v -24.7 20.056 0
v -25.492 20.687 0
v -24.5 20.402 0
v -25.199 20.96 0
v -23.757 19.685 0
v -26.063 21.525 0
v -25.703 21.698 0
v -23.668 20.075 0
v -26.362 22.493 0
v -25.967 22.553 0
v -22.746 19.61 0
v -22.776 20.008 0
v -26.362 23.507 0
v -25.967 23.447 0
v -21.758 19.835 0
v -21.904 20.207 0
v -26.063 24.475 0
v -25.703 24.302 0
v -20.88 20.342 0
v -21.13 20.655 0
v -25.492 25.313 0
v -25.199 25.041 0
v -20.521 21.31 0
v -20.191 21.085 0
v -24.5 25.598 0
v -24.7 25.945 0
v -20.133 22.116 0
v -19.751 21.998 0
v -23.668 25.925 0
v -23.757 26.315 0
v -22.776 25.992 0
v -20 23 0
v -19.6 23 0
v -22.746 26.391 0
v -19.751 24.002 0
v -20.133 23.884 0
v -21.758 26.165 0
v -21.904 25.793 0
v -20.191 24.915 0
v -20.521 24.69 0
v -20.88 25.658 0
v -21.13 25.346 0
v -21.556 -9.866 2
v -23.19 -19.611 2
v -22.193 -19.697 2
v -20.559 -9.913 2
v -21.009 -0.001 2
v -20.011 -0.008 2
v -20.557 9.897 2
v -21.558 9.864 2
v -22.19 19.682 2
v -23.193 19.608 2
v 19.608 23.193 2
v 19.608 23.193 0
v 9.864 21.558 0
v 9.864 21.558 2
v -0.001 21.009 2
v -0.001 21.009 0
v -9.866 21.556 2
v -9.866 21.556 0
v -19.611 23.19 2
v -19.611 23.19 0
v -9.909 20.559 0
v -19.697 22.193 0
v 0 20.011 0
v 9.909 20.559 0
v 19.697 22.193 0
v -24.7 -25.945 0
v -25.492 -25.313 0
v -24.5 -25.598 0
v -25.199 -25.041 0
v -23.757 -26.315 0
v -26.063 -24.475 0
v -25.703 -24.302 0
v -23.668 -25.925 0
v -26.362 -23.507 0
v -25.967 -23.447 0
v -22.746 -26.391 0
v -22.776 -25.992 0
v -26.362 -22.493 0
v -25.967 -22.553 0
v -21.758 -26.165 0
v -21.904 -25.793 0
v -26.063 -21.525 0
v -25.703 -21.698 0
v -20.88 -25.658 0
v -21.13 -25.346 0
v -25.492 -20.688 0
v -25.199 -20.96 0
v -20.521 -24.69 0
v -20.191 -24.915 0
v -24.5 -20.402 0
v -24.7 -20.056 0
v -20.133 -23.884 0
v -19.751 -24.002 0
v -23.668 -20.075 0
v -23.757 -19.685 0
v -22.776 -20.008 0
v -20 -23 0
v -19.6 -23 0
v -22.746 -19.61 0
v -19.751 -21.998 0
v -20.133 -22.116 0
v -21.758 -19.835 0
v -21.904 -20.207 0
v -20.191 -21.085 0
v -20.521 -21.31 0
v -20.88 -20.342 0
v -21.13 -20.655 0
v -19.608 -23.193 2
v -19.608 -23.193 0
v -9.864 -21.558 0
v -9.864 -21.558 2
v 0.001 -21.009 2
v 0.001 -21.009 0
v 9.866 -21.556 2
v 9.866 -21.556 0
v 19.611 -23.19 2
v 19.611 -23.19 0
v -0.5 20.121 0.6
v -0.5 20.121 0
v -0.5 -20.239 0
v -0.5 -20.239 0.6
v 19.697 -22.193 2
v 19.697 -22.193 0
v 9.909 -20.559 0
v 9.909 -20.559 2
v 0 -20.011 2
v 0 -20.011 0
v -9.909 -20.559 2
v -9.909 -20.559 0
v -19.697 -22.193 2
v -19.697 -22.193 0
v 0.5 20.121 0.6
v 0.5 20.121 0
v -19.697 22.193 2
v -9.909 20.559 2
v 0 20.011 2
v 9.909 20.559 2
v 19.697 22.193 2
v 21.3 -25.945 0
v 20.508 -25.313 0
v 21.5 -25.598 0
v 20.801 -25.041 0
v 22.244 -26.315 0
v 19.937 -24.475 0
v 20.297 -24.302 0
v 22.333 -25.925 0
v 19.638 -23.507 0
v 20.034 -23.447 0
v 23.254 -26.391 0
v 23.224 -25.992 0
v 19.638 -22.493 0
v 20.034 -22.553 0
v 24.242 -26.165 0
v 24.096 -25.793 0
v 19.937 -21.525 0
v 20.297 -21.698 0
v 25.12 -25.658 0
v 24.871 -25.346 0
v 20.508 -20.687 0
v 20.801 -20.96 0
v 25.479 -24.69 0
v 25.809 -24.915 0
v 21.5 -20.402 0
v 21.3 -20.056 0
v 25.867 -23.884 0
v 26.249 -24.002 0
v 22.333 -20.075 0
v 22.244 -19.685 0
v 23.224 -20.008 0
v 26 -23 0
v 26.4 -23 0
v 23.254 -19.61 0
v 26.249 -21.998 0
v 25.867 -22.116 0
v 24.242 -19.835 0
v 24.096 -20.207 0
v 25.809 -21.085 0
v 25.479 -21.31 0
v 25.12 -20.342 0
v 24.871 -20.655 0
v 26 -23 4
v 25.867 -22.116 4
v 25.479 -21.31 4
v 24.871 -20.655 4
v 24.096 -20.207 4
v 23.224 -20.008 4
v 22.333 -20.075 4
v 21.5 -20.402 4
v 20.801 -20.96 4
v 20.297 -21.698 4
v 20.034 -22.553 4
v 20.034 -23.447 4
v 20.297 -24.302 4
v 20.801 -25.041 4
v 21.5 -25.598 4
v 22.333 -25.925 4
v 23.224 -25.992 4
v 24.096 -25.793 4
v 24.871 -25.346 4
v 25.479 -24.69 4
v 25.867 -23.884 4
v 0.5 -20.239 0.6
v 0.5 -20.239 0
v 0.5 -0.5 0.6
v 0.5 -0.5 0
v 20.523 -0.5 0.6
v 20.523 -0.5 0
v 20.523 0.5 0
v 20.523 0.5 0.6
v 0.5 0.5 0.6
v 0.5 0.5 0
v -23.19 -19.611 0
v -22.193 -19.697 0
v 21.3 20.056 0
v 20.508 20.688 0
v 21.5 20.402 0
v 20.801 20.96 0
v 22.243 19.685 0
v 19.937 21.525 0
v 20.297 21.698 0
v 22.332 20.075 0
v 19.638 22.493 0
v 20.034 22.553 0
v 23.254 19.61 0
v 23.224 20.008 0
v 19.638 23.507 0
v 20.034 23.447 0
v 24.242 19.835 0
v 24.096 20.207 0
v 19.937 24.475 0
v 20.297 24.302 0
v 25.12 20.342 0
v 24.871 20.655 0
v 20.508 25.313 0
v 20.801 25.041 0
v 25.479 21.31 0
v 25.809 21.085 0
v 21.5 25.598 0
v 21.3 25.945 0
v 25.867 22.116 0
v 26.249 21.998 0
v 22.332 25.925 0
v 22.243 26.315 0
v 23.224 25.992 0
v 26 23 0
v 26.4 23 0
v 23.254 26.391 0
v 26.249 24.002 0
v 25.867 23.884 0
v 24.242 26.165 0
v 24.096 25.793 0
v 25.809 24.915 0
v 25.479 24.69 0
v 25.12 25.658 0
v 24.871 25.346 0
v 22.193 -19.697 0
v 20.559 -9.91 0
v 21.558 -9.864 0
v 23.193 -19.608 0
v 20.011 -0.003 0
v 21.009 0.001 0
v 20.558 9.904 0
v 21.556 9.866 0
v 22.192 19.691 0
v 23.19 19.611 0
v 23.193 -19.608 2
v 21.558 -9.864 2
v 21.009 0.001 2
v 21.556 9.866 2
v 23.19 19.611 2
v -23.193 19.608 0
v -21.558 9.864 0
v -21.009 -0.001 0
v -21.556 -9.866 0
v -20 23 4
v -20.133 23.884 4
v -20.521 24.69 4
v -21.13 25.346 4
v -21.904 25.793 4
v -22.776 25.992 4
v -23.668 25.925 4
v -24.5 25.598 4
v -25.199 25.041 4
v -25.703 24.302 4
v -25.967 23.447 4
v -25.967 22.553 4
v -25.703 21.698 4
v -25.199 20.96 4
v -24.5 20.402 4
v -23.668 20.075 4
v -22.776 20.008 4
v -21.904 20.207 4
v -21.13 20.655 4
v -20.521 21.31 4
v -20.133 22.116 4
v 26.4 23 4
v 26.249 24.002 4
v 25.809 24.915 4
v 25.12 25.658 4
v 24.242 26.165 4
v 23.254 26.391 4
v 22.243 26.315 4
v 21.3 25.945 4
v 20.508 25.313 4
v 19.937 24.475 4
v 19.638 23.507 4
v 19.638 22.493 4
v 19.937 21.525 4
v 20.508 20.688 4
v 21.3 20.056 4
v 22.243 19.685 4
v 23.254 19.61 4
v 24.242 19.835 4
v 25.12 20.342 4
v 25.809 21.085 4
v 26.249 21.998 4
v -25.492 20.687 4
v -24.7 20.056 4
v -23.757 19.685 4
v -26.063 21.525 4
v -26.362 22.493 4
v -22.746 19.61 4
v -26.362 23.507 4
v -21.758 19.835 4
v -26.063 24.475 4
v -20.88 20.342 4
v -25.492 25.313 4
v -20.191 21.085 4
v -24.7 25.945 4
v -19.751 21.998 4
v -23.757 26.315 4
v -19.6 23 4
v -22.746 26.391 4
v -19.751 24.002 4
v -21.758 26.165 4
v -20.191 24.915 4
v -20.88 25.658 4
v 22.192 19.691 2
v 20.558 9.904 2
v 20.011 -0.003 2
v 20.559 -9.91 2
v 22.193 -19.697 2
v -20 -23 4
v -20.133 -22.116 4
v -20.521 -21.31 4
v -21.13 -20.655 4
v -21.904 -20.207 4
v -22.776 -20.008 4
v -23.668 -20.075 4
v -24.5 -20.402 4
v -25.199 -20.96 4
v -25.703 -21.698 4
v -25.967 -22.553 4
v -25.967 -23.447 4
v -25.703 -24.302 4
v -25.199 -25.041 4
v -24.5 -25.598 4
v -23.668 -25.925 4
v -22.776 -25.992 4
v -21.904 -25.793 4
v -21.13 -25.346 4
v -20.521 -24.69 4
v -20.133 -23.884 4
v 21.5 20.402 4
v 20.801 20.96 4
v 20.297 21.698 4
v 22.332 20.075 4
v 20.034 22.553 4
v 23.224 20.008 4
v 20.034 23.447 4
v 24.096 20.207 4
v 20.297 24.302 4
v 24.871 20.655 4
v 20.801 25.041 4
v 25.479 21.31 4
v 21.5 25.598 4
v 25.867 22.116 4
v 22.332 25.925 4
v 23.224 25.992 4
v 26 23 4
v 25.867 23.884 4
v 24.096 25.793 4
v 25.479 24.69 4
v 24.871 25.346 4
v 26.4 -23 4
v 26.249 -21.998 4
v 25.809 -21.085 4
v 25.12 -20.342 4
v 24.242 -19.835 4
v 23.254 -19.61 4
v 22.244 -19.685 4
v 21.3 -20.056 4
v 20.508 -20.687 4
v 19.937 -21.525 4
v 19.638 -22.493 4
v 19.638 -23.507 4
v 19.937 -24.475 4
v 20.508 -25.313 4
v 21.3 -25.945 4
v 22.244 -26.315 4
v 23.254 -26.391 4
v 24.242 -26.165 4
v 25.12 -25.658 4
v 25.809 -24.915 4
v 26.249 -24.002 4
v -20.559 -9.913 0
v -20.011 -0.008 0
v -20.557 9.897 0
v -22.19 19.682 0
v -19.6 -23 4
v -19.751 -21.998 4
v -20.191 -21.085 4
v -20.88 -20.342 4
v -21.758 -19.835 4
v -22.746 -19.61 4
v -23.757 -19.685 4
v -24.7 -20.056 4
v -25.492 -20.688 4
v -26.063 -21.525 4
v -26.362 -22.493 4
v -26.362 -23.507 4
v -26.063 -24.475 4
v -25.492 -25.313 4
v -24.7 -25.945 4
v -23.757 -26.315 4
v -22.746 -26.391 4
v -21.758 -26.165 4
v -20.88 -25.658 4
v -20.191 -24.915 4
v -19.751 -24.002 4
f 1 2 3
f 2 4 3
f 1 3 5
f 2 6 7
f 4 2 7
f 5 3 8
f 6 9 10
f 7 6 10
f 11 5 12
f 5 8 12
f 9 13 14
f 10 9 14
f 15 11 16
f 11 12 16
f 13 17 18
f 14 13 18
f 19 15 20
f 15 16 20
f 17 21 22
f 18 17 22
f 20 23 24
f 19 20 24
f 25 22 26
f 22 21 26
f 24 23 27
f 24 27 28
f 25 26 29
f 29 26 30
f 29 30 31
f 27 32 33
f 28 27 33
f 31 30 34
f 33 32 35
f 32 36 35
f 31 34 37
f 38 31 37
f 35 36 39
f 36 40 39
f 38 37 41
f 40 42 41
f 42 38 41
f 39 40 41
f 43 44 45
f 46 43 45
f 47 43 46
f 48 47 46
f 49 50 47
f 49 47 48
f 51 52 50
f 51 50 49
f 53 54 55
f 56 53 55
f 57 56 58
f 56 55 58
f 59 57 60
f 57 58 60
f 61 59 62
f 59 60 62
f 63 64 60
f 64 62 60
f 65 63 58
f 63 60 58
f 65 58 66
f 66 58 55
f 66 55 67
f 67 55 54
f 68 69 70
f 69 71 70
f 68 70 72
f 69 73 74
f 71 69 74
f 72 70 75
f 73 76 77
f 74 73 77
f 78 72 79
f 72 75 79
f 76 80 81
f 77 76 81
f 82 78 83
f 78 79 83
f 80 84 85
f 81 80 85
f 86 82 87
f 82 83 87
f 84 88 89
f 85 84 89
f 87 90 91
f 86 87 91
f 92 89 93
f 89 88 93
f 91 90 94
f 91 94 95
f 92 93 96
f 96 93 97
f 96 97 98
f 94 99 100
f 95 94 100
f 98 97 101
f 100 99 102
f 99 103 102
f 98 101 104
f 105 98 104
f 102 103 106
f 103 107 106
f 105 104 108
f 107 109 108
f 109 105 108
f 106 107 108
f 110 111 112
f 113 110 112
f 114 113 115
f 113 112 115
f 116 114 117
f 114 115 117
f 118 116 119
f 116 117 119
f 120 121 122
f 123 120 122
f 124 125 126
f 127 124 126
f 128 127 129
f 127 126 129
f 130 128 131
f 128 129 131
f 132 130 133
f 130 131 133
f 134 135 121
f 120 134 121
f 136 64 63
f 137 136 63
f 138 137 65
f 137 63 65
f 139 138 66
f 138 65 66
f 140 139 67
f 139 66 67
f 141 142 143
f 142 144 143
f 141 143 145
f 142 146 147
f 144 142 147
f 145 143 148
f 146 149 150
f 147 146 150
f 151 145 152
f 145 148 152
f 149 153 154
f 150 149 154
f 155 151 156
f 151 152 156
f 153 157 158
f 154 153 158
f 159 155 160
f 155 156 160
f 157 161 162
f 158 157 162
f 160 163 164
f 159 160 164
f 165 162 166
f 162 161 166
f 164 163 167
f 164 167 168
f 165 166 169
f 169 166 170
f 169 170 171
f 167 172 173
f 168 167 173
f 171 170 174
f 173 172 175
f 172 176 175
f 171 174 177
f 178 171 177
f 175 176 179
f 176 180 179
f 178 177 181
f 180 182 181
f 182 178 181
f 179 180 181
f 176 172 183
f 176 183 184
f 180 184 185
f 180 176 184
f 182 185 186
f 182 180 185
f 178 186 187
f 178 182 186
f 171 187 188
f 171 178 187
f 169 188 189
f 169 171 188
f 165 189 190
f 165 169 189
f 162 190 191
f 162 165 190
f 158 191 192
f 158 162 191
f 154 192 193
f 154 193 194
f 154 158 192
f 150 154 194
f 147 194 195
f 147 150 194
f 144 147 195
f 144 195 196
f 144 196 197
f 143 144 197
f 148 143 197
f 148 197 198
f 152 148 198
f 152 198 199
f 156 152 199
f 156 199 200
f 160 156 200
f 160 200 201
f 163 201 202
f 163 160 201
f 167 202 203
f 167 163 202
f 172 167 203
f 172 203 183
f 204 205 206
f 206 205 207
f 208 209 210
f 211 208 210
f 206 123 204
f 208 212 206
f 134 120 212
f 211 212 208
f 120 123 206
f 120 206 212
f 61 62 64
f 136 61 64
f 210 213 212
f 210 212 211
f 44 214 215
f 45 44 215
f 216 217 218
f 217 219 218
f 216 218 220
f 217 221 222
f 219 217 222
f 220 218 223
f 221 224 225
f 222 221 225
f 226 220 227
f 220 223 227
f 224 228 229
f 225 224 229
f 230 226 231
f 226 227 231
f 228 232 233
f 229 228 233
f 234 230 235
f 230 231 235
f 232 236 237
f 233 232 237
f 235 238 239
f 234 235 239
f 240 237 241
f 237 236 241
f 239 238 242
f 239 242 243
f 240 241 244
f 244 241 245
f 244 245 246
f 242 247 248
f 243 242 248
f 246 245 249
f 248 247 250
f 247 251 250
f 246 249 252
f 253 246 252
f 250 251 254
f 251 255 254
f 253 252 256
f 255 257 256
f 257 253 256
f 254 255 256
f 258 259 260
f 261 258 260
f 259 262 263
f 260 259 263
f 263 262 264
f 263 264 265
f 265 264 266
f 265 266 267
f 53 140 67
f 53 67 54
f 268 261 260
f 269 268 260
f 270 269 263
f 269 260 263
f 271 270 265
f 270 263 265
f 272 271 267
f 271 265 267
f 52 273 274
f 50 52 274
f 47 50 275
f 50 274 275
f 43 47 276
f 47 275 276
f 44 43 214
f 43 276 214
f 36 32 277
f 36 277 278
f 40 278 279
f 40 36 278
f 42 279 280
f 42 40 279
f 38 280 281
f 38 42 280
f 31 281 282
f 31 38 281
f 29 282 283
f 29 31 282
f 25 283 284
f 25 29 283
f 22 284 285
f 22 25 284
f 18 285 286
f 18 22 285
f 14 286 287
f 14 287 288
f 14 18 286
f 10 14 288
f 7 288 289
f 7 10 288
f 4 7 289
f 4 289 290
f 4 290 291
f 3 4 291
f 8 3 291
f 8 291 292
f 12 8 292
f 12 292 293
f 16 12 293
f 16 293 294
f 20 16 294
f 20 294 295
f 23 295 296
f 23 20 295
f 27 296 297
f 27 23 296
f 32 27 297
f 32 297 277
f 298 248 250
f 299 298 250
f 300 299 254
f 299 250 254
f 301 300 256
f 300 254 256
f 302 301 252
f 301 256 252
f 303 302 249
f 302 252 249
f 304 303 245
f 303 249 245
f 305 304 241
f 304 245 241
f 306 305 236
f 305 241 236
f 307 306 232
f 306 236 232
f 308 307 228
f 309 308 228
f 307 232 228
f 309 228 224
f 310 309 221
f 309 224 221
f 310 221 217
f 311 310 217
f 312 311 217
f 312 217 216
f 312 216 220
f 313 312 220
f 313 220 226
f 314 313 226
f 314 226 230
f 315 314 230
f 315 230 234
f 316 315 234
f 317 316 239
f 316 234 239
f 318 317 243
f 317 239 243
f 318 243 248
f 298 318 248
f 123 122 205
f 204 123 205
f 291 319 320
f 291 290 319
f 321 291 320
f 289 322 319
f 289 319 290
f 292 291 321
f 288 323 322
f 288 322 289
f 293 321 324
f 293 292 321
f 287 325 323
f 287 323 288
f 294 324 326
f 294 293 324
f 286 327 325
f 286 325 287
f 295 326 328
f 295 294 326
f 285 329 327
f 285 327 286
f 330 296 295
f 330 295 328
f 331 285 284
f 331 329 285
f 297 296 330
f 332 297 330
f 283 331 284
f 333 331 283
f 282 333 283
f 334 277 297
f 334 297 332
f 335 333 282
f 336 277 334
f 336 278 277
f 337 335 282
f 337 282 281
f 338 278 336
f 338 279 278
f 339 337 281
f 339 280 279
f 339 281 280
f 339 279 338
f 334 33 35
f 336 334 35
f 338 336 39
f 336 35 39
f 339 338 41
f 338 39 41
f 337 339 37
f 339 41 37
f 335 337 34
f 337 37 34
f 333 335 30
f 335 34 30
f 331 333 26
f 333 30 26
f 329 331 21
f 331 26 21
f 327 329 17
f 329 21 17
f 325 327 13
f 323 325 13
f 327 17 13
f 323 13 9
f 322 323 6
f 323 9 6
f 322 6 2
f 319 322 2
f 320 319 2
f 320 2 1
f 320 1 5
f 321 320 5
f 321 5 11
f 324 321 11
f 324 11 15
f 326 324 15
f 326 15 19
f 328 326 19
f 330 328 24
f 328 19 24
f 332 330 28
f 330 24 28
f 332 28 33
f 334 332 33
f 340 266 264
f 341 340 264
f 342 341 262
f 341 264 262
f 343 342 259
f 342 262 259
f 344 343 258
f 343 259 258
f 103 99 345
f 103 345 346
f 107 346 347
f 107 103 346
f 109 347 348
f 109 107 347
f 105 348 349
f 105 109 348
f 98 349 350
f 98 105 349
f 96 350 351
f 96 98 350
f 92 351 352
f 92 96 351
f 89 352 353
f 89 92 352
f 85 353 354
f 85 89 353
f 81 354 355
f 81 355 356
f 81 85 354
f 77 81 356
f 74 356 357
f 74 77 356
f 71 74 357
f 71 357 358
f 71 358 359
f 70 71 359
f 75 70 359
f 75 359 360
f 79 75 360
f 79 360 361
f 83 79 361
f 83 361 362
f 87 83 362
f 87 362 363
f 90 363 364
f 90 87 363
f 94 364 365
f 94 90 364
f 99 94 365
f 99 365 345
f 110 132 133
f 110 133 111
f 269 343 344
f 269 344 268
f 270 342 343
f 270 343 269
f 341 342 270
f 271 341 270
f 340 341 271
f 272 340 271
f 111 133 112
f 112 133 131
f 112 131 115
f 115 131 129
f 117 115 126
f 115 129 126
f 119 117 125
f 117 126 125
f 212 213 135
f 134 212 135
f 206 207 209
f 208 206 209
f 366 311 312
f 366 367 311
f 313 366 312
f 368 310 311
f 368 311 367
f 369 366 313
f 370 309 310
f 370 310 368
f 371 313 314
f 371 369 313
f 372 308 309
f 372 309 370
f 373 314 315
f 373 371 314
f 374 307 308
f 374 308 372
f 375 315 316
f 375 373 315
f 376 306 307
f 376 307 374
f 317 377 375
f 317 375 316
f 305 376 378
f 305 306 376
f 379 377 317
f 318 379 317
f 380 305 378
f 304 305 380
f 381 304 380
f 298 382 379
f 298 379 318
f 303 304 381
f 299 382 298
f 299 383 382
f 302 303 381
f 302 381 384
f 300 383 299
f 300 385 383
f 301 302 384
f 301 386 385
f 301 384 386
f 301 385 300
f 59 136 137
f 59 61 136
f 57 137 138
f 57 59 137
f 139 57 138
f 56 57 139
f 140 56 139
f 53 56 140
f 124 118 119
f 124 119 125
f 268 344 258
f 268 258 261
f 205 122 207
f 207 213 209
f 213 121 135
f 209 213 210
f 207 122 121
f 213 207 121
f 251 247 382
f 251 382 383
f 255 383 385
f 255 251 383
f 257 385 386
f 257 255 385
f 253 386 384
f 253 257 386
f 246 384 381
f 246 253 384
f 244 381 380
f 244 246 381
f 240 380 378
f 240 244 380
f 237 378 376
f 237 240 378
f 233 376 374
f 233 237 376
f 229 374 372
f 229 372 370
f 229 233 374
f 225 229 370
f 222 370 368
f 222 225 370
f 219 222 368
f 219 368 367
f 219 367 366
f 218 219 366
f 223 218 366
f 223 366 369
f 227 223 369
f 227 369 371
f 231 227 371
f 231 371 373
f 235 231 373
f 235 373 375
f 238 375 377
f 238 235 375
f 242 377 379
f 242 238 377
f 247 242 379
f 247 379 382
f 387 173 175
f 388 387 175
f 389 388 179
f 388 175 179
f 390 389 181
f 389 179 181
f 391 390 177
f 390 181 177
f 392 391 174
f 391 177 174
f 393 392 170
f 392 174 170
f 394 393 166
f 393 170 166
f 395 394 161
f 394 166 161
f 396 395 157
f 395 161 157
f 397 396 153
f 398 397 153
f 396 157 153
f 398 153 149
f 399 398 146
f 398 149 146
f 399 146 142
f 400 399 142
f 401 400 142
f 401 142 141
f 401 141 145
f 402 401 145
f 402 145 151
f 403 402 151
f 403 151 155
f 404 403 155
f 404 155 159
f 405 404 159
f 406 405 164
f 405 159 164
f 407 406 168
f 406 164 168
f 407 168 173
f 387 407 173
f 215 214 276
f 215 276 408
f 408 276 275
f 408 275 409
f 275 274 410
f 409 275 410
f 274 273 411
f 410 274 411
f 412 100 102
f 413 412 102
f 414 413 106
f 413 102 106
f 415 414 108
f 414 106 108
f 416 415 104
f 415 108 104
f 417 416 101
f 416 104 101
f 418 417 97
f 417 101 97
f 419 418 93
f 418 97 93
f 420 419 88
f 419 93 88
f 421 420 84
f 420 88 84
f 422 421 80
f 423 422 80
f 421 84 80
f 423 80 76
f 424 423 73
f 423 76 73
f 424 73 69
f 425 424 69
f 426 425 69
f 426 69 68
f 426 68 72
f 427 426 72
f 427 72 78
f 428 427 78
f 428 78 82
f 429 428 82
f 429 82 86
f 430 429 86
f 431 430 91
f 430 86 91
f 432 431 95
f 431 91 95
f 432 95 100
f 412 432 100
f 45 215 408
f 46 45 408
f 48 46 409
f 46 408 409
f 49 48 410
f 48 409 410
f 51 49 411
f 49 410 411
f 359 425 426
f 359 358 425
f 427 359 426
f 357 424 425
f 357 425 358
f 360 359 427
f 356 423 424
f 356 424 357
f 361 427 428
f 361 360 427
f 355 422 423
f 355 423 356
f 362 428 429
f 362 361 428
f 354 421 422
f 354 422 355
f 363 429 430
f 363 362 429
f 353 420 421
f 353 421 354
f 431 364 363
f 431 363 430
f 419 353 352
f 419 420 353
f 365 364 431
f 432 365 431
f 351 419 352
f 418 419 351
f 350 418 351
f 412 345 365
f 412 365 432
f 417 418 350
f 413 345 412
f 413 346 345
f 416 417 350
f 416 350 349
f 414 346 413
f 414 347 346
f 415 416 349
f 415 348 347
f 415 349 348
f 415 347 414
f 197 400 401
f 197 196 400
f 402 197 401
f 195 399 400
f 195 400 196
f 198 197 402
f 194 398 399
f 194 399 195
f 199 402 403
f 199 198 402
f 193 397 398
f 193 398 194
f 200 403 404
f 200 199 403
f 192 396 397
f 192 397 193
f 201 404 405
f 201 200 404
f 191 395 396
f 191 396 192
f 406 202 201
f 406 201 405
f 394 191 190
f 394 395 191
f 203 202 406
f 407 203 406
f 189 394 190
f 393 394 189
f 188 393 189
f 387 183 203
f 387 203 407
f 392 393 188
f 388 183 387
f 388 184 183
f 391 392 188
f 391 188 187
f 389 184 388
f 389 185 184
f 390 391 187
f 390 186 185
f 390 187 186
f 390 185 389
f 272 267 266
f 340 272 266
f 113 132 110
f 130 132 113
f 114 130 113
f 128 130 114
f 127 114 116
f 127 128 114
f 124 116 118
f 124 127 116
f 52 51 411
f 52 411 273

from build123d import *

# Parameters (mm, degrees)
F1_R     = 3.4
F1_R_2   = 3
F2_DEPTH = 4
F3_DEPTH = 2
F4_W     = 20.0225106329
F4_H     = 1
F4_W_2   = 0.5
F5_DEPTH = 0.6


with BuildPart() as f2:
    # F1 (on Top) → F2 (new body)
    with BuildSketch(Plane.XY):
        with Locations((-23.0000428855, -23.0001099408)):
            Circle(F1_R)
        with Locations((-23.0000428855, -23.0001099408)):
            Circle(F1_R_2, mode=Mode.SUBTRACT)
    extrude(amount=F2_DEPTH)


with BuildPart() as f2b:
    # F1 (on Top) → F2, piece 2 (new body)
    with BuildSketch(Plane.XY):
        with Locations((23.0001099408, -23.0000428855)):
            Circle(F1_R)
        with Locations((23.0001099408, -23.0000428855)):
            Circle(F1_R_2, mode=Mode.SUBTRACT)
    extrude(amount=F2_DEPTH)


with BuildPart() as f2c:
    # F1 (on Top) → F2, piece 3 (new body)
    with BuildSketch(Plane.XY):
        with Locations((23.0000428855, 23.0001099408)):
            Circle(F1_R)
        with Locations((23.0000428855, 23.0001099408)):
            Circle(F1_R_2, mode=Mode.SUBTRACT)
    extrude(amount=F2_DEPTH)


with BuildPart() as f2d:
    # F1 (on Top) → F2, piece 4 (new body)
    with BuildSketch(Plane.XY):
        with Locations((-23.0001099408, 23.0000428855)):
            Circle(F1_R)
        with Locations((-23.0001099408, 23.0000428855)):
            Circle(F1_R_2, mode=Mode.SUBTRACT)
    extrude(amount=F2_DEPTH)


with BuildPart() as f3:
    # F0 (on Top) → F3 (new body)
    with BuildSketch(Plane.XY):
        with BuildLine():
            Line((-23.1896166539, -19.6105202347), (-22.1933558134, -19.6970732439))
            ThreePointArc((-22.1933558134, -19.6970732439), (-20.0114938313, -0.0077955563), (-22.1899449169, 19.6818598097))
            Line((-22.1899449169, 19.6818598097), (-23.1933854726, 19.6076260275))
            ThreePointArc((-23.1933854726, 19.6076260275), (-21.0094546656, -0.0012374114), (-23.1896166539, -19.6105202347))
        make_face()
    extrude(amount=F3_DEPTH)


with BuildPart() as f3b:
    # F0 (on Top) → F3, piece 2 (new body)
    with BuildSketch(Plane.XY):
        with BuildLine():
            ThreePointArc((22.1920466744, 19.6912356229), (20.0114935429, -0.0029768646), (22.193349492, -19.69704506))
            Line((22.193349492, -19.69704506), (23.1933854726, -19.6076260275))
            ThreePointArc((23.1933854726, -19.6076260275), (21.0094546656, 0.0012374114), (23.1896166539, 19.6105202347))
            Line((23.1896166539, 19.6105202347), (22.1920466744, 19.6912356229))
        make_face()
    extrude(amount=F3_DEPTH)


with BuildPart() as f3c:
    # F0 (on Top) → F3, piece 3 (new body)
    with BuildSketch(Plane.XY):
        with BuildLine():
            Line((19.6105202347, -23.1896166539), (19.6972026091, -22.1933848294))
            ThreePointArc((19.6972026091, -22.1933848294), (6.62897e-05, -20.0114934937), (-19.6970732439, -22.1933558134))
            Line((-19.6970732439, -22.1933558134), (-19.6076260275, -23.1933854726))
            ThreePointArc((-19.6076260275, -23.1933854726), (0.0012374114, -21.0094546656), (19.6105202347, -23.1896166539))
        make_face()
    extrude(amount=F3_DEPTH)


with BuildPart() as f3d:
    # F0 (on Top) → F3, piece 4 (new body)
    with BuildSketch(Plane.XY):
        with BuildLine():
            ThreePointArc((-19.6971722044, 22.1933780097), (1.70497e-05, 20.0114934937), (19.6972054771, 22.1933854726))
            Line((19.6972054771, 22.1933854726), (19.6076260275, 23.1933854726))
            ThreePointArc((19.6076260275, 23.1933854726), (-0.0012374114, 21.0094546656), (-19.6105202347, 23.1896166539))
            Line((-19.6105202347, 23.1896166539), (-19.6971722044, 22.1933780097))
        make_face()
    extrude(amount=F3_DEPTH)


with BuildPart() as f5:
    # F4 (on Top) → F5 (new body)
    with BuildSketch(Plane.XY):
        Polygon((0.5, 0.5), (0.5, 20.1212763786), (-0.5, 20.1212763786), (-0.5, -20.2392917126), (0.5, -20.2392917126), (0.5, -0.5), (0, -0.5), (0, 0.5), align=None)
        with Locations((10.5112553164, 0)):
            Rectangle(F4_W, F4_H)
        with Locations((0.25, 0)):
            Rectangle(F4_W_2, F4_H)
    extrude(amount=F5_DEPTH)


solid = Compound([f2.part, f2b.part, f2c.part, f2d.part, f3.part, f3b.part, f3c.part, f3d.part, f5.part])
